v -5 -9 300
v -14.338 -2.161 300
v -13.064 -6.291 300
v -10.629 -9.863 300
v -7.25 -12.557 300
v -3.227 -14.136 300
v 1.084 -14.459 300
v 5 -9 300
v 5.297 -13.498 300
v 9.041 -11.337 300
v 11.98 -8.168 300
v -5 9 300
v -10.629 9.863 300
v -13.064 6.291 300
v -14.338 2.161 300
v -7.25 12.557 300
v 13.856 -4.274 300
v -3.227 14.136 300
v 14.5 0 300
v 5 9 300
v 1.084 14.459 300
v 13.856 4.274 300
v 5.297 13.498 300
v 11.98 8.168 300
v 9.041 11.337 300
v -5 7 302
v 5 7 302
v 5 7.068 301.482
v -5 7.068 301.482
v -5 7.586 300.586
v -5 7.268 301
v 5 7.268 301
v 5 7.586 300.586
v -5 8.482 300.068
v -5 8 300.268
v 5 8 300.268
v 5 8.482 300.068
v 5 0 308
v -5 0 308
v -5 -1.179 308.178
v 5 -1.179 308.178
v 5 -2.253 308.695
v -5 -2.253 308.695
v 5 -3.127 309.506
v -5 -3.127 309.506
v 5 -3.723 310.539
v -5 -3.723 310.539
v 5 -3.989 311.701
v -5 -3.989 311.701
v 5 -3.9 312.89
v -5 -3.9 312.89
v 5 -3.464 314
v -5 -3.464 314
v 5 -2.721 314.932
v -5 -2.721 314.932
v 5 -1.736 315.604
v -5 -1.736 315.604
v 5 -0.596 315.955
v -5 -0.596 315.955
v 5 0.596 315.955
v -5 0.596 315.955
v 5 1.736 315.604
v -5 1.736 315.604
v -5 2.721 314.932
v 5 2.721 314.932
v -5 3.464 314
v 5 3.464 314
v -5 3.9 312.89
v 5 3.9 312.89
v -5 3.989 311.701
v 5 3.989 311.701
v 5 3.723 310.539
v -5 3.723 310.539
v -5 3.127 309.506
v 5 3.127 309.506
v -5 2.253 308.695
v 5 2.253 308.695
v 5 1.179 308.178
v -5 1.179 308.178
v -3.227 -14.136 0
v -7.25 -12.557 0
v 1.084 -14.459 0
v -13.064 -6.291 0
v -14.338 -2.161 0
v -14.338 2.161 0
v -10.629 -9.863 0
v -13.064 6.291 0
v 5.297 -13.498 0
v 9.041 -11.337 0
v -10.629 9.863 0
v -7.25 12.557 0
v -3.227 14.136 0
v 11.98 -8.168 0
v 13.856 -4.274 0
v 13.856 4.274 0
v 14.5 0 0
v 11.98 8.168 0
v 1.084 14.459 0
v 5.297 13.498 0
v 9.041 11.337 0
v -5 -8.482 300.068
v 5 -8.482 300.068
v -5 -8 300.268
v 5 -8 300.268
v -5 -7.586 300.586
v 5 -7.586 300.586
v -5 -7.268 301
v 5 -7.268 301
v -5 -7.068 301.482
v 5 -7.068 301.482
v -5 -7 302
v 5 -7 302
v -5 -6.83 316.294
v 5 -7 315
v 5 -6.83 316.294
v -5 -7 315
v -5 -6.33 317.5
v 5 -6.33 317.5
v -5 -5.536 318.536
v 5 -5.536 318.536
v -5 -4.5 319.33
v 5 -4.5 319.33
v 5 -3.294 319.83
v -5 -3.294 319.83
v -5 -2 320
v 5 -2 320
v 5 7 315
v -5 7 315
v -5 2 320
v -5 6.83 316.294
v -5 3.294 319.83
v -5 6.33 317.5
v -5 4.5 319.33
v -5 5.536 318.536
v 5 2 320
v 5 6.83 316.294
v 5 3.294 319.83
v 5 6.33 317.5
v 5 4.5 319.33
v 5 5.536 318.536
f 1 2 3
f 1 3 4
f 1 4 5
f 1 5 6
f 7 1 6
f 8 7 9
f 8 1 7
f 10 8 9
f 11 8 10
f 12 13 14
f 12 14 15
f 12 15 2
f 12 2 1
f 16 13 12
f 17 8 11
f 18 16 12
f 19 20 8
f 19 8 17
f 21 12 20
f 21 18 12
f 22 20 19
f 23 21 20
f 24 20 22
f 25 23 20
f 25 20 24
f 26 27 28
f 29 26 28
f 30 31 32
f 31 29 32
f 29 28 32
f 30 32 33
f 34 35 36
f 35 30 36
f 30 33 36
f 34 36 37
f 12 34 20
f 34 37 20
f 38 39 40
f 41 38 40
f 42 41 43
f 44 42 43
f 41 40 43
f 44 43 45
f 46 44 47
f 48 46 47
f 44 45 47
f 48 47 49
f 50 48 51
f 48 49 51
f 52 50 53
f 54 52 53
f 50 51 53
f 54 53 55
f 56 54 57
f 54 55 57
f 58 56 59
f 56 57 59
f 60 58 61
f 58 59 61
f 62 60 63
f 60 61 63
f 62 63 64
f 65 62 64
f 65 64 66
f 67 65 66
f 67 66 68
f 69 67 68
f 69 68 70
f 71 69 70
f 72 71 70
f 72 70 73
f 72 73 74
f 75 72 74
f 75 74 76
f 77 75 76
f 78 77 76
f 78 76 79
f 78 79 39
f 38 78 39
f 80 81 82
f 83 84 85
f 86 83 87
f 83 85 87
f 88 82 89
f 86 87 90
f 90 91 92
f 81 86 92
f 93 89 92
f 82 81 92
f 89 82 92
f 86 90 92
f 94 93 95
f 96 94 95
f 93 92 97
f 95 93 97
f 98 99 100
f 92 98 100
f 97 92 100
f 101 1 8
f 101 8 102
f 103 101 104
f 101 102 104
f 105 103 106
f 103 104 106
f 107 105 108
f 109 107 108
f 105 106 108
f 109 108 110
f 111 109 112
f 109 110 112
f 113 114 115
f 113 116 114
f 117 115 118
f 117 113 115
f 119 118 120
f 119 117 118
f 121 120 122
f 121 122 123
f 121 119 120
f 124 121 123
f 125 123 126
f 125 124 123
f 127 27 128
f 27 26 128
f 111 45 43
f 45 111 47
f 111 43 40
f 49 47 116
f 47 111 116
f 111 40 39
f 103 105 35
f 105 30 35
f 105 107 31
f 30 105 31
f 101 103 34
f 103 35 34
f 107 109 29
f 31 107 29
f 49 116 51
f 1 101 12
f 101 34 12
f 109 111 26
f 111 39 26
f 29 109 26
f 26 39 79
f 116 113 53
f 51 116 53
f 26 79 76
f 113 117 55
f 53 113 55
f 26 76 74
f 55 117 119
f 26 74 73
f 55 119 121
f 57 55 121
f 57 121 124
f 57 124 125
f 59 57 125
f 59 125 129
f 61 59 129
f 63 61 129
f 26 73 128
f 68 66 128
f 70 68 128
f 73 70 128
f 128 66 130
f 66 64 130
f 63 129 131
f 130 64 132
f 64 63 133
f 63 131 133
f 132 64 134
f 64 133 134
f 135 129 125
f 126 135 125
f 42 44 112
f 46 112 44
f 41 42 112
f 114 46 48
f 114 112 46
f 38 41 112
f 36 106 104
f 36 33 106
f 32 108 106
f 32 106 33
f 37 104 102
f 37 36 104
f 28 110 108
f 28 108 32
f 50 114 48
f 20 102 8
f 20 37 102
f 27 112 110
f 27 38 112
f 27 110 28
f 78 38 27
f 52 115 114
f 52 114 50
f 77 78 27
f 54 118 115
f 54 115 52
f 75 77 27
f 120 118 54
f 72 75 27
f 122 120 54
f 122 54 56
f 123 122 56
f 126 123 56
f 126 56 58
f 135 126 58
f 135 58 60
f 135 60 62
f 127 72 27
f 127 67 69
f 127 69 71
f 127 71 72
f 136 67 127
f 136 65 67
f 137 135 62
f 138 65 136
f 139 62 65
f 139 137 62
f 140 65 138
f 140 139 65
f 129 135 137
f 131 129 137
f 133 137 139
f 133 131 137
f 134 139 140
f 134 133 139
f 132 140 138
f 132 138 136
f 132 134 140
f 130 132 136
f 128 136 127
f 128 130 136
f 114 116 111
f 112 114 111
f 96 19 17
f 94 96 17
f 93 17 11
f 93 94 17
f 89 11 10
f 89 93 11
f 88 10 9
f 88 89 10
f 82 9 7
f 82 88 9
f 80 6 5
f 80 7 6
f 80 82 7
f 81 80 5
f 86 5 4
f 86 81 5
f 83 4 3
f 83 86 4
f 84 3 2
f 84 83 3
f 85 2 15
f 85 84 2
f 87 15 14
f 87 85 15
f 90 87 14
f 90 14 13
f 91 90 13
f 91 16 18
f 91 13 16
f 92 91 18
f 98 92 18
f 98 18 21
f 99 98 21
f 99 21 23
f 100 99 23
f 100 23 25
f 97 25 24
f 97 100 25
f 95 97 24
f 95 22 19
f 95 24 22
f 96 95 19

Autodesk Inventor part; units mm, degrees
ref_plane "YZ Plane" through (0, 0, 0) normal (1, 0, 0) x (0, 1, 0)
ref_plane "XZ Plane" through (0, 0, 0) normal (0, 1, 0) x (-1, 0, 0)
ref_plane "XY Plane" through (0, 0, 0) normal (0, 0, 1) x (1, 0, 0)
sketch "Sketch1" plane through (0, 0, 0) normal (0, 0, 1) x (1, 0, 0)
  circle A0 centre (0, 0) radius 14.5
  dimension "d6" = 29
extrude "Extrusion3" add sketch "Sketch1" along normal blind 300
sketch "Sketch3" plane through (0, 0, 0) normal (1, 0, 0) x (0, 1, 0)
  line L0 (-7, 295.5461) -> (7, 295.5461)
  line L1 (7, 295.5461) -> (7, 320)
  line L2 (7, 320) -> (-7, 320)
  line L3 (-7, 320) -> (-7, 295.5461)
  line L4 (0, 384) -> (0, -64) projected
  line L5 (14.5, 300) -> (-14.5, 300) projected
  point P0 (0, 0)
  point P1 (7, 300)
  point P2 (-7, 300)
  dimension "d9" = 7
  dimension "d10" = 7
  dimension "d11" = 20
extrude "Extrusion4" add sketch "Sketch3" along normal mid plane 10 contours L3 L2 L4 L5 | L4 L2 L1 L5
fillet "Fillet1" radius 2 2 edges at (0, -7, 300) (0, 7, 300)
fillet "Fillet2" radius 5 2 edges at (0, -7, 320) (0, 7, 320)
sketch "Sketch4" plane through (5, 0, 0) normal (1, 0, 0) x (0, 0, -1)
  line L0 (-320, 2) -> (-320, -2) projected
  point P0 (0, 0)
  point P1 (-312, 0)
  dimension "d16" = 8
hole "Hole1" at (5, 0, 312) direction (-1, 0, 0) diameter 8 end through all
equation "\"d10\" = d9"
properties part number "linear_actuator_LH"
